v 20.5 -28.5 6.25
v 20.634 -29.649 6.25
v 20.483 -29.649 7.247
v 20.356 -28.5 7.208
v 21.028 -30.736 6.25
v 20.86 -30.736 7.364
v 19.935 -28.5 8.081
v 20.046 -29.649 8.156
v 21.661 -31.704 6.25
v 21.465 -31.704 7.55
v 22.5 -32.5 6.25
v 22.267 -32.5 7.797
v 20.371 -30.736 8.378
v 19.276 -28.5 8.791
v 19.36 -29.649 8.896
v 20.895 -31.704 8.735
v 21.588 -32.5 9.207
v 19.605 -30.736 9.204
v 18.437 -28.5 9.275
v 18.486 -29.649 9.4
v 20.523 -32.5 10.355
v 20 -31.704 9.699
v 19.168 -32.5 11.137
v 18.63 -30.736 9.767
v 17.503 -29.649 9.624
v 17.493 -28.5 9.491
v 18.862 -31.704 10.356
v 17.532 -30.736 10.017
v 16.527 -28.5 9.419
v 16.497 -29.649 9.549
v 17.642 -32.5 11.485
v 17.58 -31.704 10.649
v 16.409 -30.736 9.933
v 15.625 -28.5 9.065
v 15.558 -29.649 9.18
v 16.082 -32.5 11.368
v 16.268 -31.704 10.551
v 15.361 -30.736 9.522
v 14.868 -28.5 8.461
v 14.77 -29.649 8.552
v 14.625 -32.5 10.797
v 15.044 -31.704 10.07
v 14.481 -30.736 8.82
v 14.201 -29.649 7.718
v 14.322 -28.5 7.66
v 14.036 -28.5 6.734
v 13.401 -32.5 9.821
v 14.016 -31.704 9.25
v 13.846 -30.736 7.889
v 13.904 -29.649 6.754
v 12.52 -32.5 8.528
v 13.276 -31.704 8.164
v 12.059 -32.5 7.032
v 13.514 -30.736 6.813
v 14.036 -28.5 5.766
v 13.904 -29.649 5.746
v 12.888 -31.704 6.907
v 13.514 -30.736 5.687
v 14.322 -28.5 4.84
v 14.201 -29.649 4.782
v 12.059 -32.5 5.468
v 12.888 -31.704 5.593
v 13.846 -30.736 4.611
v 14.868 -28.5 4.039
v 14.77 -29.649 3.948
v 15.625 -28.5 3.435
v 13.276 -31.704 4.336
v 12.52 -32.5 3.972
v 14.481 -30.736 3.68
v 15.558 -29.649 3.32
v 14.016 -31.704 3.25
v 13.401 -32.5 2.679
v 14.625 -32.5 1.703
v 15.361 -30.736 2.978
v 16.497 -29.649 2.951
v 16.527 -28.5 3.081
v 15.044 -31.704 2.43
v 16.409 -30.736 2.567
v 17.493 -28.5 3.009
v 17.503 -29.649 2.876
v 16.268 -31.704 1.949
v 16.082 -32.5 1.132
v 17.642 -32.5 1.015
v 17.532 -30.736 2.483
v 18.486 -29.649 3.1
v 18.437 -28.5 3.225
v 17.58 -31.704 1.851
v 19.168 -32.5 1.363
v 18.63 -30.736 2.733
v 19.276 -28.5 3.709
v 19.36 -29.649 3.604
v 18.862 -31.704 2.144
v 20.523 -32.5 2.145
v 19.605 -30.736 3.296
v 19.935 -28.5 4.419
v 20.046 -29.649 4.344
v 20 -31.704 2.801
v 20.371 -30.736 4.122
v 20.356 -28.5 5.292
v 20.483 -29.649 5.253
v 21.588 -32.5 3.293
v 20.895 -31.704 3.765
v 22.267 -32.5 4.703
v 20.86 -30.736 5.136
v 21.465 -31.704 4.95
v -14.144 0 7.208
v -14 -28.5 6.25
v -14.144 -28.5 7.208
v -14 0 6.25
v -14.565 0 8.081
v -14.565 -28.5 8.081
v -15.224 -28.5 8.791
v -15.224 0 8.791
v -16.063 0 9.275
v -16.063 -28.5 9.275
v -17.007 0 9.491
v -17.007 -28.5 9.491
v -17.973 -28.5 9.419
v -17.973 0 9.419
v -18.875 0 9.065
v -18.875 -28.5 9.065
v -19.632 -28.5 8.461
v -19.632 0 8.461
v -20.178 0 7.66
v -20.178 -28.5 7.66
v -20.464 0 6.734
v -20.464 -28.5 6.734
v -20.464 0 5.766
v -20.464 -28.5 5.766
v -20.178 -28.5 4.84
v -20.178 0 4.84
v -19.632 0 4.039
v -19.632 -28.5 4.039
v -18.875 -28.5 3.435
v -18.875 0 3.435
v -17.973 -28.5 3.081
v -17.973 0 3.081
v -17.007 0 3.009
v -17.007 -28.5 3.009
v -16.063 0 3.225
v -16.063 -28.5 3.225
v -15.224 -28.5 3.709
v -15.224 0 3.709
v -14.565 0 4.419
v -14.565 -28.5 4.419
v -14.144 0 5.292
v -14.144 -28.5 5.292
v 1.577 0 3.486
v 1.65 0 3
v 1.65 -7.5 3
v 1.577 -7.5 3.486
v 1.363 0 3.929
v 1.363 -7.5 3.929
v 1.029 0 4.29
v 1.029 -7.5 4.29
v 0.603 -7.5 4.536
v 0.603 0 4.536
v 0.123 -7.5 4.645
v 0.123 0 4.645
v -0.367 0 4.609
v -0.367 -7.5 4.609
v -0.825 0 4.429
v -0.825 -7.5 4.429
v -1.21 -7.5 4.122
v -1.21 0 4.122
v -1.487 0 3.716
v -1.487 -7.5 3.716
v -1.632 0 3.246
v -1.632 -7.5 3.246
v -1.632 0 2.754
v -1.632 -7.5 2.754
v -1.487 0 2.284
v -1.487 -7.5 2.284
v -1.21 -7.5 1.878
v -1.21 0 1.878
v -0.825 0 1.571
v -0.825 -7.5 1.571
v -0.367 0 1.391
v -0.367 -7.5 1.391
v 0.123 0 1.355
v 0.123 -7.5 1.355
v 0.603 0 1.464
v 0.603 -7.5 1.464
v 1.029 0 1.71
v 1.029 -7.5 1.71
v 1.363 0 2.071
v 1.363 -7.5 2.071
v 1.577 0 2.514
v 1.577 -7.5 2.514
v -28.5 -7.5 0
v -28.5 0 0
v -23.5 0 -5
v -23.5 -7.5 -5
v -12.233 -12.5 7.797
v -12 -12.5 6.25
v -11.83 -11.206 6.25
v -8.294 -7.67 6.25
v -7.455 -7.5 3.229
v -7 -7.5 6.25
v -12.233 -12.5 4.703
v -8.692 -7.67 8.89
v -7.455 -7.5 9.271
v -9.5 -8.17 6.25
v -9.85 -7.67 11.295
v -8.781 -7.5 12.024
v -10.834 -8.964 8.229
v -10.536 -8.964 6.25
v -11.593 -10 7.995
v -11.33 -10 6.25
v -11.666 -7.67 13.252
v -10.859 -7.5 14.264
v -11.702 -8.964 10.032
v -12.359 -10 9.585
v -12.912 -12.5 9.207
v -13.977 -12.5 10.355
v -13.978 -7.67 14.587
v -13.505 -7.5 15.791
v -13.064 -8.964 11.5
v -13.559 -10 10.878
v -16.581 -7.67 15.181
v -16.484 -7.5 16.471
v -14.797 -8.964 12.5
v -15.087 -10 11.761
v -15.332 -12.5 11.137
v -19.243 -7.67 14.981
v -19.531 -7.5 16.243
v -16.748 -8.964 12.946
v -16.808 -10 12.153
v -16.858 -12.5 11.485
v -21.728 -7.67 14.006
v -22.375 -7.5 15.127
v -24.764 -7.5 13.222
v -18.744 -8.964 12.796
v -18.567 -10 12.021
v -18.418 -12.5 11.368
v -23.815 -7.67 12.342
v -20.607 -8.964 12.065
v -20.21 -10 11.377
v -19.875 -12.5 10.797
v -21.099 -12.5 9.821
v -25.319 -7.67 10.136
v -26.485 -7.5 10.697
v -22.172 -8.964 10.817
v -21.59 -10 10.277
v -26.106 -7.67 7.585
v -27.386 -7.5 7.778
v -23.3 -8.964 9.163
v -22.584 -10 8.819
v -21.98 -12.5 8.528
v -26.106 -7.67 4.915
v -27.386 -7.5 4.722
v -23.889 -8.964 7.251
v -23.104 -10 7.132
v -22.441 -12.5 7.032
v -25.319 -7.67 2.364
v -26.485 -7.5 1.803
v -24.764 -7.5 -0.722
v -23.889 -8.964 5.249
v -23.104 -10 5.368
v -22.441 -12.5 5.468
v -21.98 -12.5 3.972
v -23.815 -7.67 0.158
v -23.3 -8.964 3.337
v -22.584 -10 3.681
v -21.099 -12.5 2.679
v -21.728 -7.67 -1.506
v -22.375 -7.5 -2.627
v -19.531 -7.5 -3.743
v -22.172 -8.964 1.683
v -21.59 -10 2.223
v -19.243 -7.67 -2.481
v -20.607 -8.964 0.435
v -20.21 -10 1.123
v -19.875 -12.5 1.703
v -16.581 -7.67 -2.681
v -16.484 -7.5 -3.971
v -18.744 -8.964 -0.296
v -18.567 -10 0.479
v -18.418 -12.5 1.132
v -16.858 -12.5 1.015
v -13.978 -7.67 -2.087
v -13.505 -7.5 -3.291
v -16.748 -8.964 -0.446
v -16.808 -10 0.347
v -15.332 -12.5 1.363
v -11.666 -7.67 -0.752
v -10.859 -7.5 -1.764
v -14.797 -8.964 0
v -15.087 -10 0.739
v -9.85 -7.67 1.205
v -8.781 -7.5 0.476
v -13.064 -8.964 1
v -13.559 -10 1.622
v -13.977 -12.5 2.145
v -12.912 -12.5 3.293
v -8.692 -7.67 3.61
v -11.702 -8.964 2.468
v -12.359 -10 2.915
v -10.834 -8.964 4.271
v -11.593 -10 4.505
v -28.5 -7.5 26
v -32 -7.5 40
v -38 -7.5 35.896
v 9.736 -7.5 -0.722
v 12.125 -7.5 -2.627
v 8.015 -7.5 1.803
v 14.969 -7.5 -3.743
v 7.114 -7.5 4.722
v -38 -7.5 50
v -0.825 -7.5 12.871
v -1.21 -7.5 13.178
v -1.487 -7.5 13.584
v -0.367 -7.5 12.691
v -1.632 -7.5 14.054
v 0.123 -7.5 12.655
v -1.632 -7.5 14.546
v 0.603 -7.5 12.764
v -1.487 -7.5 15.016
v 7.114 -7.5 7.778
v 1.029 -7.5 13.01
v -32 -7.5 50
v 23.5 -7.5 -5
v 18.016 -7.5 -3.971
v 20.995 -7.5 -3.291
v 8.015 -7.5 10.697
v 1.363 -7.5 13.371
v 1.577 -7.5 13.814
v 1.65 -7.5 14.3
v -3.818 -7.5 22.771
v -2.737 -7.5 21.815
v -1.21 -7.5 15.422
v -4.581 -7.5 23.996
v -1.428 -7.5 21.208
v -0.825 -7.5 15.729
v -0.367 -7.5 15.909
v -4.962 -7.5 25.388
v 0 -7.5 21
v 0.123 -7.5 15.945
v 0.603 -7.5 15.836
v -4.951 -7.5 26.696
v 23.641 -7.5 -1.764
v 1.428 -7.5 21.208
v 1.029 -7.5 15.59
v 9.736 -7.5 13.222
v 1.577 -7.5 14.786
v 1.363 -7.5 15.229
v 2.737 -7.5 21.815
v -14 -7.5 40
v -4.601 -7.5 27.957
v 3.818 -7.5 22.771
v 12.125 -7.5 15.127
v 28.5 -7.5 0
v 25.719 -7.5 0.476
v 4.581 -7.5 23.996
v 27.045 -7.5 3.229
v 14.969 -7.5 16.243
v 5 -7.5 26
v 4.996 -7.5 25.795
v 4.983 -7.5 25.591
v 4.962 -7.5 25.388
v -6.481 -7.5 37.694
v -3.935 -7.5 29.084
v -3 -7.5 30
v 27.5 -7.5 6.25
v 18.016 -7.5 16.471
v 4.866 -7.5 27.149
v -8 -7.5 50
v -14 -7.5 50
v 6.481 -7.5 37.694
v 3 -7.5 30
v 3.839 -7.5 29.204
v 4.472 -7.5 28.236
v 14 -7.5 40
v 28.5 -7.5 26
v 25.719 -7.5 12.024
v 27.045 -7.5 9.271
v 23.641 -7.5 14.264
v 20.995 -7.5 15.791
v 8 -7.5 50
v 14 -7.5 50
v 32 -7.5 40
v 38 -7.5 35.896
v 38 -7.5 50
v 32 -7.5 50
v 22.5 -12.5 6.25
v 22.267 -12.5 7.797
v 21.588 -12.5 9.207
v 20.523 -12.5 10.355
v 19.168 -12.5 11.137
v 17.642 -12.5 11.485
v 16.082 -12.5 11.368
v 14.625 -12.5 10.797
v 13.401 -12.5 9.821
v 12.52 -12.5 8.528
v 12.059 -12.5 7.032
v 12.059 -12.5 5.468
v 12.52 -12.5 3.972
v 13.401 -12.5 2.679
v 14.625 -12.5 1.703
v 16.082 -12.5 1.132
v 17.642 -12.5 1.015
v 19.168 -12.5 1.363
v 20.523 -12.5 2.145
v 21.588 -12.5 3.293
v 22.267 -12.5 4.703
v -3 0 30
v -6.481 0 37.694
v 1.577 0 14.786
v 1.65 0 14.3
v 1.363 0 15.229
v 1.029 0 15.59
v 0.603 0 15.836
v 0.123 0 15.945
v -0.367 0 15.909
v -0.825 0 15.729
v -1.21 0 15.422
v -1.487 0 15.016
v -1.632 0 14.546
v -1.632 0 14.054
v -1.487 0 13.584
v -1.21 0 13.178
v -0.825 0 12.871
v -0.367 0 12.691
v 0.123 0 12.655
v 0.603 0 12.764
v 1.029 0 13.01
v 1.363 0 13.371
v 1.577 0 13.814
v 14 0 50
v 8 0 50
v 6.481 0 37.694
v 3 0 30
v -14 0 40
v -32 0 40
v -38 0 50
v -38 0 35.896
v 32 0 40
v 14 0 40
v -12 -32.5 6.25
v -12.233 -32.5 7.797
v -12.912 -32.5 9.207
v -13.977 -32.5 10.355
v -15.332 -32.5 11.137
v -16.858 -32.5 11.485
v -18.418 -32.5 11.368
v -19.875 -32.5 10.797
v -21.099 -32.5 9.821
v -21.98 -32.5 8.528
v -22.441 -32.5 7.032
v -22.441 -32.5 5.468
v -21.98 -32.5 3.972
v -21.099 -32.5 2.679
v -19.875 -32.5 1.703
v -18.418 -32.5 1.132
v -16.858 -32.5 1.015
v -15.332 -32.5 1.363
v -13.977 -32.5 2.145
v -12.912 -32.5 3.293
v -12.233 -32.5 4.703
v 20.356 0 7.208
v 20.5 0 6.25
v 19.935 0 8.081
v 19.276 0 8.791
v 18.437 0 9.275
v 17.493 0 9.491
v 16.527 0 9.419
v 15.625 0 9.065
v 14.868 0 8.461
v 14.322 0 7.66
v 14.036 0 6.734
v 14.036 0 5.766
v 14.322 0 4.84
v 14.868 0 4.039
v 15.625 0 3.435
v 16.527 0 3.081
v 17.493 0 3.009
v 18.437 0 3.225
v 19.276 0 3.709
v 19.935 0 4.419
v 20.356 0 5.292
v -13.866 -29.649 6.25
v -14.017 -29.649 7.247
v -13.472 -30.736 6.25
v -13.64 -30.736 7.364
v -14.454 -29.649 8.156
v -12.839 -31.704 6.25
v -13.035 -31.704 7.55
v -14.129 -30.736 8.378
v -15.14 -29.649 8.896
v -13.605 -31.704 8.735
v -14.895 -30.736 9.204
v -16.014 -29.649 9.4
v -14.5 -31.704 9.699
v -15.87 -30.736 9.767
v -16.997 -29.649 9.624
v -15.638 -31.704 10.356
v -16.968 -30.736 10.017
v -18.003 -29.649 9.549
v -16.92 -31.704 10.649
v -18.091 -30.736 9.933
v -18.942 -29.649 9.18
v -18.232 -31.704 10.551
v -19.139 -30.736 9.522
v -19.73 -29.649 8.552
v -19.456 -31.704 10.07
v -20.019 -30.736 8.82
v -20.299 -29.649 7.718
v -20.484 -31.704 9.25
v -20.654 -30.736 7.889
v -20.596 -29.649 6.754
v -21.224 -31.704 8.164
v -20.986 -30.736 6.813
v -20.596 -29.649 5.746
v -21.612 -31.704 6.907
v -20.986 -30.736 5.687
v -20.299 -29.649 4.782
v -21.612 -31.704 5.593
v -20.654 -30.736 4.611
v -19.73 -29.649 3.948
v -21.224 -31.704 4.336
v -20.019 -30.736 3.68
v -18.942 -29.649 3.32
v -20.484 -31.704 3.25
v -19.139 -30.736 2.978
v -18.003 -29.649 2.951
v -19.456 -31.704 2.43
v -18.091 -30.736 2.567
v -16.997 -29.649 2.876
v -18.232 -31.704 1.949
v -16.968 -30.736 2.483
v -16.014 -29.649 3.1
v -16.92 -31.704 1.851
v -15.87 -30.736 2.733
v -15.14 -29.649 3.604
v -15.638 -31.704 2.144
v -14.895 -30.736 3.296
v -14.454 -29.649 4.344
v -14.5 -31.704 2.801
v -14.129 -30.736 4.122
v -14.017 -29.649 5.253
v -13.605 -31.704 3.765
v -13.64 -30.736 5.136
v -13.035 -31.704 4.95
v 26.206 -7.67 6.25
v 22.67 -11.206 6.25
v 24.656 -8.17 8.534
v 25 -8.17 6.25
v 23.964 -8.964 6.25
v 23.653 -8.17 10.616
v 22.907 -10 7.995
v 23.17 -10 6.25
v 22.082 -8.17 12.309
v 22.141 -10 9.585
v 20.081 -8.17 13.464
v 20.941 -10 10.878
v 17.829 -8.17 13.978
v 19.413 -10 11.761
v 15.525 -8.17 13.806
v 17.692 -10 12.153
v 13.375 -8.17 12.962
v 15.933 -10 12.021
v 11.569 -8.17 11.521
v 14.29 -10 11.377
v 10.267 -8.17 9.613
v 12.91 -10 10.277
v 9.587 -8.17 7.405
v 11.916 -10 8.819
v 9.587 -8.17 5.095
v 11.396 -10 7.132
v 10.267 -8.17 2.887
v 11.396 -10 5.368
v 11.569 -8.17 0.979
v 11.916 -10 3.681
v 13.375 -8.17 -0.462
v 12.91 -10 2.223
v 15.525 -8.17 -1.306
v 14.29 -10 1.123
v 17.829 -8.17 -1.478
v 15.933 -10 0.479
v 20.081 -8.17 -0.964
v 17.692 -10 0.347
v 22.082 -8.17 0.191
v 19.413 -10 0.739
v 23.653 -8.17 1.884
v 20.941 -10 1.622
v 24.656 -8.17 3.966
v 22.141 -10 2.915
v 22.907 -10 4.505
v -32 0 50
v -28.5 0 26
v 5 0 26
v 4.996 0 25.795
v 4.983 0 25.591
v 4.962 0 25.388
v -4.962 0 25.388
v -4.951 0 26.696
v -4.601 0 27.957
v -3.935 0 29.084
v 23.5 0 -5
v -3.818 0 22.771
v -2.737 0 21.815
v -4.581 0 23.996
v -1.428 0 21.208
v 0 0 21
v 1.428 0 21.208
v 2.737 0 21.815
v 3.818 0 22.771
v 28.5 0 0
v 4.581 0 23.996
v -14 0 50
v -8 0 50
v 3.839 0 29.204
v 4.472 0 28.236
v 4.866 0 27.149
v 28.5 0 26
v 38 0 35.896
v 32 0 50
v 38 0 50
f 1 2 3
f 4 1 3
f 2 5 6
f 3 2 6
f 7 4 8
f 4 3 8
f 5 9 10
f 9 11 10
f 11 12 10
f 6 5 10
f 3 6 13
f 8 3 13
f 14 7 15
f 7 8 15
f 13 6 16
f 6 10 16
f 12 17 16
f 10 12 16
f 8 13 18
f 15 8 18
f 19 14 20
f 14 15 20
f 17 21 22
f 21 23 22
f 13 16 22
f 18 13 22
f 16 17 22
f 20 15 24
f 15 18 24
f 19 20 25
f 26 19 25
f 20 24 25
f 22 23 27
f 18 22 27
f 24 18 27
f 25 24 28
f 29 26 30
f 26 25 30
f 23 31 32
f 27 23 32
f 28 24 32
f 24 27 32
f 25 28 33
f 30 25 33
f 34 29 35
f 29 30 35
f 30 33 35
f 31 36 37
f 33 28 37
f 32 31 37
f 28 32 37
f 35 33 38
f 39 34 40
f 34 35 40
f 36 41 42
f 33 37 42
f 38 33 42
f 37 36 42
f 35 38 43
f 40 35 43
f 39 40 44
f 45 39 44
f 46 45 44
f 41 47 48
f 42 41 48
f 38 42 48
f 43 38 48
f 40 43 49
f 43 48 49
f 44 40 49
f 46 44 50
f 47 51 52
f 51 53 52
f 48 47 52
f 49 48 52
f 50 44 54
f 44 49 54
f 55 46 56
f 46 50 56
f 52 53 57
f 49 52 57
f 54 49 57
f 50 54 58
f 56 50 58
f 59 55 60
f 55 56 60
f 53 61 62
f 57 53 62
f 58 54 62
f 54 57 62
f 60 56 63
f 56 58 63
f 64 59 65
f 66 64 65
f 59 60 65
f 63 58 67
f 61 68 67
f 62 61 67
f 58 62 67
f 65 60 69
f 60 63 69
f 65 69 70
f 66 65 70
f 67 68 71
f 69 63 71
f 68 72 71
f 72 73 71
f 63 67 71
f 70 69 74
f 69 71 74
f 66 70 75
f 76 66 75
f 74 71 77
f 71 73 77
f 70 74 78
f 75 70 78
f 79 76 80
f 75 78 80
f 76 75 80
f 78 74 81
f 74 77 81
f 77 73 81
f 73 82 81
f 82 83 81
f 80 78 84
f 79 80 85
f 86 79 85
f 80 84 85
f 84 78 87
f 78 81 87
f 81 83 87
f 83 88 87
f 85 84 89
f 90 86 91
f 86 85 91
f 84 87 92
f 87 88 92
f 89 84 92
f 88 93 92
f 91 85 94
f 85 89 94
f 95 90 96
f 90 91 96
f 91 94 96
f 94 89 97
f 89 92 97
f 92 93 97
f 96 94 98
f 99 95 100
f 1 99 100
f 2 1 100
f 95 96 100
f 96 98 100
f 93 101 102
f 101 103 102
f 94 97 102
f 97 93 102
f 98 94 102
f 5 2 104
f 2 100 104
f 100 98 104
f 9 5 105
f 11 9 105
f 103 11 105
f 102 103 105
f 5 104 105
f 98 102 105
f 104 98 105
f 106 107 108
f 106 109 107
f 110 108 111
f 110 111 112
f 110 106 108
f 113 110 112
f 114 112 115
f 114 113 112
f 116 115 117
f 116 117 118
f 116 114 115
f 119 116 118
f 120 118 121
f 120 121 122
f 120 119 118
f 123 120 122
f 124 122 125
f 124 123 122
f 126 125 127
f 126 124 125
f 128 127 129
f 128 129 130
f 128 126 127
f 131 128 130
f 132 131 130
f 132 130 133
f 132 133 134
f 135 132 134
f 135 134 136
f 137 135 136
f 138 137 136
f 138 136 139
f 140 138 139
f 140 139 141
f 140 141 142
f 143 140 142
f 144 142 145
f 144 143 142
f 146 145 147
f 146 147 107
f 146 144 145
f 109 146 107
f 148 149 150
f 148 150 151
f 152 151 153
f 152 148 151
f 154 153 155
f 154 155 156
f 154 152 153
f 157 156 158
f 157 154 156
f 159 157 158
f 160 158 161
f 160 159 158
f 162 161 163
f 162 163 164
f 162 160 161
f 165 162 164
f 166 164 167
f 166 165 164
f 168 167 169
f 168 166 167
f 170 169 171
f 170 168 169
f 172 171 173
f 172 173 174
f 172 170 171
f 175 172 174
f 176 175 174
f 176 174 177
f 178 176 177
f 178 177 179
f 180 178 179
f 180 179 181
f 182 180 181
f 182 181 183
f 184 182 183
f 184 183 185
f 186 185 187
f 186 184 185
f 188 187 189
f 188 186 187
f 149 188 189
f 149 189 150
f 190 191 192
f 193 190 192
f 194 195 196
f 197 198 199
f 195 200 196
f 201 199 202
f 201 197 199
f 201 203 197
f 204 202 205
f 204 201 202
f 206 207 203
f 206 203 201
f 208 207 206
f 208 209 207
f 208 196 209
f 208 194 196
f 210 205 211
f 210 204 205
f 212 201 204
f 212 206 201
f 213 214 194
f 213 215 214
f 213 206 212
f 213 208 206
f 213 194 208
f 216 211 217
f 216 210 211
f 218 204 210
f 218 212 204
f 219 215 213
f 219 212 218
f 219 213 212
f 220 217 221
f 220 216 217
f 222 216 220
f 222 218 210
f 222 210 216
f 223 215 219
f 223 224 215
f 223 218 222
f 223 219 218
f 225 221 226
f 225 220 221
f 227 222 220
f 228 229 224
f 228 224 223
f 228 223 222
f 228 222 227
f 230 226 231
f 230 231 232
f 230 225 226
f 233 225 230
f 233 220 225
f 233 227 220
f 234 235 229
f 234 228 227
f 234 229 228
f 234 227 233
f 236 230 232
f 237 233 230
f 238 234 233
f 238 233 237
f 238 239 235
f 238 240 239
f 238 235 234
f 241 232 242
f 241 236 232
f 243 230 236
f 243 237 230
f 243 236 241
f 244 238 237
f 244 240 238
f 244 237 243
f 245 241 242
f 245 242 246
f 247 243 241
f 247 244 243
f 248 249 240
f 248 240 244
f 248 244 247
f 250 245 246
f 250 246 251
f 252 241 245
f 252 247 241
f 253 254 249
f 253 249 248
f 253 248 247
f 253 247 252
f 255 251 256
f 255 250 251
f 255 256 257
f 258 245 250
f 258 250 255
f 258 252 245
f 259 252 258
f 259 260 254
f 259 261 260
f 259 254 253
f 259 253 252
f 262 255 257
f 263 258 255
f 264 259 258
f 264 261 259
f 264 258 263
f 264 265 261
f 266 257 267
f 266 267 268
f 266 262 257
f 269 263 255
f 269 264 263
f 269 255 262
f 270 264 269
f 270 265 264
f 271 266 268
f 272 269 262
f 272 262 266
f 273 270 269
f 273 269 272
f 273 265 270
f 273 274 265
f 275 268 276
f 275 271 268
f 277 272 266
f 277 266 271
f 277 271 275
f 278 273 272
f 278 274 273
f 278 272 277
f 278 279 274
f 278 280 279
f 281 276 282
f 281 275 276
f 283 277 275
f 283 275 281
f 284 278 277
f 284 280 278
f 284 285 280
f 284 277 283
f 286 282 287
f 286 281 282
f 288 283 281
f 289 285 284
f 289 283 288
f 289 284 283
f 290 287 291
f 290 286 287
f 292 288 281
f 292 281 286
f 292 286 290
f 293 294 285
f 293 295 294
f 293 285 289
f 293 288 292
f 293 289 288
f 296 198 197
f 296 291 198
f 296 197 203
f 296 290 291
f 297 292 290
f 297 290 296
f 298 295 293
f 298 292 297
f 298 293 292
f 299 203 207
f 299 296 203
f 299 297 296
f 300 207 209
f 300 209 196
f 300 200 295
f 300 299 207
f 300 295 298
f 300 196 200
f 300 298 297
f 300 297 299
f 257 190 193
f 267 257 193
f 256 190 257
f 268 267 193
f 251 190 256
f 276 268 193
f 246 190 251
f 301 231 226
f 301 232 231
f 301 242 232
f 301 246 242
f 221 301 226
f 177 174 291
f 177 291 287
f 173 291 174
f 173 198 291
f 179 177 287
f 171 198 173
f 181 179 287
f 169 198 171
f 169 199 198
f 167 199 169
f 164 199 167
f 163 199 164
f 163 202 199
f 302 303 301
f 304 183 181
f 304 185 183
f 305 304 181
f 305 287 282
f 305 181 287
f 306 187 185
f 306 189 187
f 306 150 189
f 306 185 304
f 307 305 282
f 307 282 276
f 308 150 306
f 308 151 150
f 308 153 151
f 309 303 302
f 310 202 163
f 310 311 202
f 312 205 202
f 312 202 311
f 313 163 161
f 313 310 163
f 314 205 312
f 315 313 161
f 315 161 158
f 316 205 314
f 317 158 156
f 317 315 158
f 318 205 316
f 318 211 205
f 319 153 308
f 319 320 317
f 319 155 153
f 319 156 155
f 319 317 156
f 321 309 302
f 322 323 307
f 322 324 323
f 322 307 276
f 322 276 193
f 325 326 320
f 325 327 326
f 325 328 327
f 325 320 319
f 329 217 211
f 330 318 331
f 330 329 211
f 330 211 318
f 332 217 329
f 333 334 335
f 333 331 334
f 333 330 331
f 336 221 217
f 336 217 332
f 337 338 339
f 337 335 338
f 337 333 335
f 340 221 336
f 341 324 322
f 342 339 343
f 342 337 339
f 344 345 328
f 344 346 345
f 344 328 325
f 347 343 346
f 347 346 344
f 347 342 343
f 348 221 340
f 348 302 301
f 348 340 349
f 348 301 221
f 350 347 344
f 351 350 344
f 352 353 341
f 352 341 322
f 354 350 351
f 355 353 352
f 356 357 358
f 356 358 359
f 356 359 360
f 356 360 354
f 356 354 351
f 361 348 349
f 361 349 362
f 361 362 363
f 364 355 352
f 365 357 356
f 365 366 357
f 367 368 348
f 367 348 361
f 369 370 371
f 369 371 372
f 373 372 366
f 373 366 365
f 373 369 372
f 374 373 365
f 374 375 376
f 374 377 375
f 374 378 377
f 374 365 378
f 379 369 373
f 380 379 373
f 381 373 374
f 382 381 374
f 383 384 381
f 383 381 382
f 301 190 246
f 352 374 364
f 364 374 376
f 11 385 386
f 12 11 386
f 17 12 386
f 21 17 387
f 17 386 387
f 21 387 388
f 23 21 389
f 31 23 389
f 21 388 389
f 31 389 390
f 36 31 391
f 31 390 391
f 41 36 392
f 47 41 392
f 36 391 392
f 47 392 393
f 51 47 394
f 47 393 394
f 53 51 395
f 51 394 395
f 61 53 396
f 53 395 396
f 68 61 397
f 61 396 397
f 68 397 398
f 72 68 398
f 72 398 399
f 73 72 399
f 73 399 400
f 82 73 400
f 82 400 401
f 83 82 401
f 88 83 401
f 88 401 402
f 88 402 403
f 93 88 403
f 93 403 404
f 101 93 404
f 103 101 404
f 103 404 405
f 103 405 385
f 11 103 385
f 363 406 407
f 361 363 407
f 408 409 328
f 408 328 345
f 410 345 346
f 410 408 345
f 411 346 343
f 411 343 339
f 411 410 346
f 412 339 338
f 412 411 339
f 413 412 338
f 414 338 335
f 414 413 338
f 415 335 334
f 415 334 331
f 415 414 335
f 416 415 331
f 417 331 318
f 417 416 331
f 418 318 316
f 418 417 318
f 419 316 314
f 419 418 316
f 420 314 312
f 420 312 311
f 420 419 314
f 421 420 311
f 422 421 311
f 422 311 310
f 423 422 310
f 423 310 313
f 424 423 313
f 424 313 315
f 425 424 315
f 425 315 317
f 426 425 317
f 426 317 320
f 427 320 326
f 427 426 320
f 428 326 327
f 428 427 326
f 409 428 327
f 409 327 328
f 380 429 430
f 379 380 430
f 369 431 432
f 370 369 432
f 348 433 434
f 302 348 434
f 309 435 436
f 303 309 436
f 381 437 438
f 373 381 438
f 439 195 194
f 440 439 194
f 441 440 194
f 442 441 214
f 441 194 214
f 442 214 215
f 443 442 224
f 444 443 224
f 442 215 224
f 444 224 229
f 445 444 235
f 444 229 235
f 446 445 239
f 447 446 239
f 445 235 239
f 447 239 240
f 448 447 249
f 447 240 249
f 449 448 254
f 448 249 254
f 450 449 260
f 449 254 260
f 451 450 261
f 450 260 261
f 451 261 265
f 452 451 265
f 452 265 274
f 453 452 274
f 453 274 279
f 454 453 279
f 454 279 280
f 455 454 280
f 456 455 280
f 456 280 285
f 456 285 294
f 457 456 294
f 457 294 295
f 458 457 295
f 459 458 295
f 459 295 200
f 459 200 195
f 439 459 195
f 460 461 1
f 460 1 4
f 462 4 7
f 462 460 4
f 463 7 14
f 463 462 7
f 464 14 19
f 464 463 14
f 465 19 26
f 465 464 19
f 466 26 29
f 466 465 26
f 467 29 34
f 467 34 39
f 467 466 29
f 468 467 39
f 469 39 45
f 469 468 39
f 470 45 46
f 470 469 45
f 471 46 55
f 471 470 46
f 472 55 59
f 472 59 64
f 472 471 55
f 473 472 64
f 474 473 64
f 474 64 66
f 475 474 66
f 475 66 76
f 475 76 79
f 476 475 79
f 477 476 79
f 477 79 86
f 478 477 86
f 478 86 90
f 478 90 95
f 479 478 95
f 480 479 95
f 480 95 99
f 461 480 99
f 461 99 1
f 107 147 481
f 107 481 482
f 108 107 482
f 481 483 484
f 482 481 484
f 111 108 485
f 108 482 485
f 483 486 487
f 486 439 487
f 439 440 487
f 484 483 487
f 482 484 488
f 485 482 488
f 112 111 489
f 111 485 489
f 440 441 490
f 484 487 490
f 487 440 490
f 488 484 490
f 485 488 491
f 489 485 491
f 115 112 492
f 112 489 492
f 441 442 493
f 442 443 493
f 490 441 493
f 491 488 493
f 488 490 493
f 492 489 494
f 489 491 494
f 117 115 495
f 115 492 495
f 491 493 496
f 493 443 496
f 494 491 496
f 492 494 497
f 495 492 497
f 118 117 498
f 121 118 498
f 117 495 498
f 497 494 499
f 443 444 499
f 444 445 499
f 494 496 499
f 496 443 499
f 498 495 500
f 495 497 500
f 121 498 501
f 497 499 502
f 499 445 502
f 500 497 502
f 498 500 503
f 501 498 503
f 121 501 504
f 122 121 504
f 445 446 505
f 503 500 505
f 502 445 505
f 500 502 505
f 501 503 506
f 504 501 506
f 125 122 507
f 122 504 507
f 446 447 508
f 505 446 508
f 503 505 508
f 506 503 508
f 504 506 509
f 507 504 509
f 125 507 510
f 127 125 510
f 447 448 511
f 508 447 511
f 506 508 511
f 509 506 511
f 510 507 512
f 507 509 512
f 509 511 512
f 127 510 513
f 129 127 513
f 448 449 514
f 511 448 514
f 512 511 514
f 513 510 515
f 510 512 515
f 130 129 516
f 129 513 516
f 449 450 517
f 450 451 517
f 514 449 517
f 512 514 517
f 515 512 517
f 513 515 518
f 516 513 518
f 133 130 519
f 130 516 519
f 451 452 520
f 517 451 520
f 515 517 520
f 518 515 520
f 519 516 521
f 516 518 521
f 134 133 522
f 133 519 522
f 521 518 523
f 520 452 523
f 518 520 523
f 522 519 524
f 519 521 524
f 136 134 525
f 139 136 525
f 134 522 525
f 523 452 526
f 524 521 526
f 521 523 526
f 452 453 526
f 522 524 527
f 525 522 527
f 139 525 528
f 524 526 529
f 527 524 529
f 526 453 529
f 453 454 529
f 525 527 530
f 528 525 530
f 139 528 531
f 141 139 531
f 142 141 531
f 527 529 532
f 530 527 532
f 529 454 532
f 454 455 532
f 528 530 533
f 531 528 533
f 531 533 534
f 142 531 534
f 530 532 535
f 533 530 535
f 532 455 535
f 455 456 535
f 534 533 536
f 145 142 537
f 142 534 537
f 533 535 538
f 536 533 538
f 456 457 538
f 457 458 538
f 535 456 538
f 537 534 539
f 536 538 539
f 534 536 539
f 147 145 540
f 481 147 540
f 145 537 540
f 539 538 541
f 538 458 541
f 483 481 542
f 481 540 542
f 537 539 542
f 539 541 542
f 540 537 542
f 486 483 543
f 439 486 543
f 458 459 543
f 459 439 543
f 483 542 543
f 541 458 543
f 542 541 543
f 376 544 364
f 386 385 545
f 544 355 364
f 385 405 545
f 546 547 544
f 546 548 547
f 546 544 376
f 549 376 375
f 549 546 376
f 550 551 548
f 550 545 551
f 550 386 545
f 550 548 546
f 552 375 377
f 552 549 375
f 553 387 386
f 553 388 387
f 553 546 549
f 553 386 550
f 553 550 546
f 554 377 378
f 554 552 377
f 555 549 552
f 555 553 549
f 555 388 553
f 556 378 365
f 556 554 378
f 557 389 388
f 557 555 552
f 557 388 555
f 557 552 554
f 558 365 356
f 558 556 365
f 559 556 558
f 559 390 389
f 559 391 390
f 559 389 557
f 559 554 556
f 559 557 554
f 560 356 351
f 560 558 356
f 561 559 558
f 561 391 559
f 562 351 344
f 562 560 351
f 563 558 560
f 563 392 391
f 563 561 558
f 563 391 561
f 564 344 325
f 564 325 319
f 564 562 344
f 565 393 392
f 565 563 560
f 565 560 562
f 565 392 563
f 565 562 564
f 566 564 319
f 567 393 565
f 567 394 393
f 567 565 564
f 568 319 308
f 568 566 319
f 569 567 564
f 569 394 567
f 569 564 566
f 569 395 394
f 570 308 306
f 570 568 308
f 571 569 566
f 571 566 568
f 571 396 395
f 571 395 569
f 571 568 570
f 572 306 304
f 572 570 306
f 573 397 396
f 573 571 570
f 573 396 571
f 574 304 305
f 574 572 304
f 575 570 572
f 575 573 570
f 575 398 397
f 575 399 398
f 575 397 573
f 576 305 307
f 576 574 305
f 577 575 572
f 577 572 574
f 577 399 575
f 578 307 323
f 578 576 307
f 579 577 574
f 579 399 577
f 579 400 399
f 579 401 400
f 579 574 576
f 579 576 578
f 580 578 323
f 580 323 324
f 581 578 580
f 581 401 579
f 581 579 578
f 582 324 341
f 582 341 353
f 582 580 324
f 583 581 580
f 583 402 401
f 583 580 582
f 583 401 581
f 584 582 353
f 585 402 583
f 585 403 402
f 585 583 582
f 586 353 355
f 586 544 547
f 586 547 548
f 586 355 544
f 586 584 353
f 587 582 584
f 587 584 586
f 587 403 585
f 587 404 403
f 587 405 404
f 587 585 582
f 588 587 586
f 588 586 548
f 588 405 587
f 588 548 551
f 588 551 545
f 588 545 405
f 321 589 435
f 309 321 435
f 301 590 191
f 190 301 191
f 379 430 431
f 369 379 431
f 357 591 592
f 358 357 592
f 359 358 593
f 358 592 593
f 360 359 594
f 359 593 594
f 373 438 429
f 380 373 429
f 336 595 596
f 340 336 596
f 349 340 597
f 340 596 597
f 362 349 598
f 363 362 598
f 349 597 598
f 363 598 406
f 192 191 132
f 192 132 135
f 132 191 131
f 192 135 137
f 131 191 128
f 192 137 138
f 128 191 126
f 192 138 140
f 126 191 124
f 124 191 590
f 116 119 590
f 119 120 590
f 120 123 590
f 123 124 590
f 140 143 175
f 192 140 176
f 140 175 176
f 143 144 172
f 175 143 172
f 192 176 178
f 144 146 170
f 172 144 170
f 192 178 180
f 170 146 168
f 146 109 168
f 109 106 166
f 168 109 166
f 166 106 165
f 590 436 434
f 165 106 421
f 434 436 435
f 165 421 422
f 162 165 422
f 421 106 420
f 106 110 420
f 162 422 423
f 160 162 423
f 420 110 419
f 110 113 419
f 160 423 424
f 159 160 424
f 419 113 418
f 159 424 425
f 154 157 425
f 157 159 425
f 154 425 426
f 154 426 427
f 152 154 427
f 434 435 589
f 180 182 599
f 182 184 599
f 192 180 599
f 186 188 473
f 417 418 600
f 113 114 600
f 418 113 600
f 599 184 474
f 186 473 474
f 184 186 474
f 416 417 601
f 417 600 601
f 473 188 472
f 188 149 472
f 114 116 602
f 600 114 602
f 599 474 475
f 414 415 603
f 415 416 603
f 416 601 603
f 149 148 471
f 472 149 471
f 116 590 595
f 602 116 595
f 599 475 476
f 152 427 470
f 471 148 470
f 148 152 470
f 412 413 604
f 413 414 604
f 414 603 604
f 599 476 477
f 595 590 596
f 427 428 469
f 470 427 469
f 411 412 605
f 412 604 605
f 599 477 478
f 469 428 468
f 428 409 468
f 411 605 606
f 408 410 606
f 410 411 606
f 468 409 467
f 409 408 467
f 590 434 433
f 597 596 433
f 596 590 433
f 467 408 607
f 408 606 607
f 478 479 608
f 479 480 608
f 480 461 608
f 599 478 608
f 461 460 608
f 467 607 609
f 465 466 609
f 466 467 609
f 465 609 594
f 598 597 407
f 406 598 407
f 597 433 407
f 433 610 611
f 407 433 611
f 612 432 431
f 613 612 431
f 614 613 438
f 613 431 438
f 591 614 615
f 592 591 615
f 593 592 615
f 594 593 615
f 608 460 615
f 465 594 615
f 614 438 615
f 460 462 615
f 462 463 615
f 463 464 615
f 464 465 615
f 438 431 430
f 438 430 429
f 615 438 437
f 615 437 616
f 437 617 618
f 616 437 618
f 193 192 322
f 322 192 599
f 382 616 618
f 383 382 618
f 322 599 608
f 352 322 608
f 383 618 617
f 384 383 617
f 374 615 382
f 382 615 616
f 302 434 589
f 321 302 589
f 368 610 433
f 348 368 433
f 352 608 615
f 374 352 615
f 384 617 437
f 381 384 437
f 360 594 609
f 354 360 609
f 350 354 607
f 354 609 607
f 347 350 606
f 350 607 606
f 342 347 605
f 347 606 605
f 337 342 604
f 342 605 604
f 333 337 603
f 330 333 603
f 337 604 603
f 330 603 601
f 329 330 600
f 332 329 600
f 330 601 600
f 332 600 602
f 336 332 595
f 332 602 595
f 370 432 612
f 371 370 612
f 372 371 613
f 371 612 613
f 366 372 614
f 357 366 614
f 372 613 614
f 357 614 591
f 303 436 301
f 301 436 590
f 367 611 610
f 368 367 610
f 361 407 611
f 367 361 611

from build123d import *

# Parameters (mm, degrees)
F0_R     = 3.25
F0_R_2   = 1.65
F1_DEPTH = 7.5
F2_R     = 5.25
F2_R_2   = 3.25
F3_DEPTH = 25


# Not quite as in the source:
# - a fillet or chamfer that OpenCascade refuses, or shapes differently, is made with other operations: its cross-section is extruded or revolved along the edge and cut away or added


with BuildPart() as f1:
    # F0 (on Front) → F1 (new body)
    with BuildSketch(Plane.XZ):
        with BuildLine():
            Line((-3, 30), (-6.4811743939, 37.693775202))
            Line((-6.4811743939, 37.693775202), (-4.9623487879, 25.387550404))
            ThreePointArc((-4.9623487879, 25.387550404), (-4.6009153843, 27.9574416023), (-3, 30))
        make_face()
        with BuildLine():
            Line((4.9623487879, 25.387550404), (6.4811743939, 37.693775202))
            Line((6.4811743939, 37.693775202), (3, 30))
            ThreePointArc((3, 30), (4.472135955, 28.2360679775), (5, 26))
            ThreePointArc((5, 26), (4.9905783202, 25.6931970822), (4.9623487879, 25.387550404))
        make_face()
        with BuildLine():
            Line((-28.5, 0), (-23.5, -5))
            Line((-23.5, -5), (23.5, -5))
            Line((23.5, -5), (28.5, 0))
            Line((28.5, 0), (28.5, 26))
            Line((28.5, 26), (38, 35.8959565787))
            Line((38, 35.8959565787), (38, 50))
            Line((38, 50), (32, 50))
            Line((32, 50), (32, 40))
            Line((32, 40), (14, 40))
            Line((14, 40), (14, 50))
            Line((14, 50), (8, 50))
            Line((8, 50), (6.4811743939, 37.693775202))
            Line((6.4811743939, 37.693775202), (4.9623487879, 25.387550404))
            ThreePointArc((4.9623487879, 25.387550404), (0, 21), (-4.9623487879, 25.387550404))
            Line((-4.9623487879, 25.387550404), (-6.4811743939, 37.693775202))
            Line((-6.4811743939, 37.693775202), (-8, 50))
            Line((-8, 50), (-14, 50))
            Line((-14, 50), (-14, 40))
            Line((-14, 40), (-32, 40))
            Line((-32, 40), (-32, 50))
            Line((-32, 50), (-38, 50))
            Line((-38, 50), (-38, 35.8959565787))
            Line((-38, 35.8959565787), (-28.5, 26))
            Line((-28.5, 26), (-28.5, 0))
        make_face()
        with Locations((-17.25, 6.25)):
            Circle(F0_R, mode=Mode.SUBTRACT)
        with Locations((0, 3)):
            Circle(F0_R_2, mode=Mode.SUBTRACT)
        with Locations((17.25, 6.25)):
            Circle(F0_R, mode=Mode.SUBTRACT)
        with Locations((0, 14.3)):
            Circle(F0_R_2, mode=Mode.SUBTRACT)
    extrude(amount=F1_DEPTH)

    # F2 (on face) → F3 (join)
    with BuildSketch(Plane.XZ.offset(7.5)):
        with Locations((-17.25, 6.25)):
            Circle(F2_R)
        with Locations((-17.25, 6.25)):
            Circle(F2_R_2, mode=Mode.SUBTRACT)
        with Locations((17.25, 6.25)):
            Circle(F2_R)
        with Locations((17.25, 6.25)):
            Circle(F2_R_2, mode=Mode.SUBTRACT)
    extrude(amount=F3_DEPTH)

    # F4: fillet of radius 5 on 4 edges, made by hand

    # F4_s1 → F4_t2 (revolve)
    with BuildSketch(Plane.XY.offset(6.25)):
        with BuildLine():
            ThreePointArc((-7, -7.5), (-10.5355339059, -8.9644660941), (-12, -12.5))
            Line((-12, -12.5), (-12, -7.5))
            Line((-12, -7.5), (-7, -7.5))
        make_face()
    revolve(axis=Axis((-17.25, -7.5, 6.25), (0, -1, 0)))

    # F4_s3 → F4_t4 (revolve)
    with BuildSketch(Plane.XY.offset(6.25)):
        with BuildLine():
            ThreePointArc((27.5, -7.5), (23.9644660941, -8.9644660941), (22.5, -12.5))
            Line((22.5, -12.5), (22.5, -7.5))
            Line((22.5, -7.5), (27.5, -7.5))
        make_face()
    revolve(axis=Axis((17.25, -7.5, 6.25), (0, -1, 0)))

    # F4_s5 → F4_t6 (revolve, cut)
    with BuildSketch(Plane.XY.offset(6.25)):
        with BuildLine():
            ThreePointArc((20.5, -28.5), (21.027864045, -30.7360679775), (22.5, -32.5))
            Line((22.5, -32.5), (20.5, -32.5))
            Line((20.5, -32.5), (20.5, -28.5))
        make_face()
    revolve(axis=Axis((17.25, -32.5, 6.25), (0, -1, 0)), mode=Mode.SUBTRACT)

    # F4_s7 → F4_t8 (revolve, cut)
    with BuildSketch(Plane.XY.offset(6.25)):
        with BuildLine():
            ThreePointArc((-14, -28.5), (-13.472135955, -30.7360679775), (-12, -32.5))
            Line((-12, -32.5), (-14, -32.5))
            Line((-14, -32.5), (-14, -28.5))
        make_face()
    revolve(axis=Axis((-17.25, -32.5, 6.25), (0, -1, 0)), mode=Mode.SUBTRACT)


solid = f1.part
